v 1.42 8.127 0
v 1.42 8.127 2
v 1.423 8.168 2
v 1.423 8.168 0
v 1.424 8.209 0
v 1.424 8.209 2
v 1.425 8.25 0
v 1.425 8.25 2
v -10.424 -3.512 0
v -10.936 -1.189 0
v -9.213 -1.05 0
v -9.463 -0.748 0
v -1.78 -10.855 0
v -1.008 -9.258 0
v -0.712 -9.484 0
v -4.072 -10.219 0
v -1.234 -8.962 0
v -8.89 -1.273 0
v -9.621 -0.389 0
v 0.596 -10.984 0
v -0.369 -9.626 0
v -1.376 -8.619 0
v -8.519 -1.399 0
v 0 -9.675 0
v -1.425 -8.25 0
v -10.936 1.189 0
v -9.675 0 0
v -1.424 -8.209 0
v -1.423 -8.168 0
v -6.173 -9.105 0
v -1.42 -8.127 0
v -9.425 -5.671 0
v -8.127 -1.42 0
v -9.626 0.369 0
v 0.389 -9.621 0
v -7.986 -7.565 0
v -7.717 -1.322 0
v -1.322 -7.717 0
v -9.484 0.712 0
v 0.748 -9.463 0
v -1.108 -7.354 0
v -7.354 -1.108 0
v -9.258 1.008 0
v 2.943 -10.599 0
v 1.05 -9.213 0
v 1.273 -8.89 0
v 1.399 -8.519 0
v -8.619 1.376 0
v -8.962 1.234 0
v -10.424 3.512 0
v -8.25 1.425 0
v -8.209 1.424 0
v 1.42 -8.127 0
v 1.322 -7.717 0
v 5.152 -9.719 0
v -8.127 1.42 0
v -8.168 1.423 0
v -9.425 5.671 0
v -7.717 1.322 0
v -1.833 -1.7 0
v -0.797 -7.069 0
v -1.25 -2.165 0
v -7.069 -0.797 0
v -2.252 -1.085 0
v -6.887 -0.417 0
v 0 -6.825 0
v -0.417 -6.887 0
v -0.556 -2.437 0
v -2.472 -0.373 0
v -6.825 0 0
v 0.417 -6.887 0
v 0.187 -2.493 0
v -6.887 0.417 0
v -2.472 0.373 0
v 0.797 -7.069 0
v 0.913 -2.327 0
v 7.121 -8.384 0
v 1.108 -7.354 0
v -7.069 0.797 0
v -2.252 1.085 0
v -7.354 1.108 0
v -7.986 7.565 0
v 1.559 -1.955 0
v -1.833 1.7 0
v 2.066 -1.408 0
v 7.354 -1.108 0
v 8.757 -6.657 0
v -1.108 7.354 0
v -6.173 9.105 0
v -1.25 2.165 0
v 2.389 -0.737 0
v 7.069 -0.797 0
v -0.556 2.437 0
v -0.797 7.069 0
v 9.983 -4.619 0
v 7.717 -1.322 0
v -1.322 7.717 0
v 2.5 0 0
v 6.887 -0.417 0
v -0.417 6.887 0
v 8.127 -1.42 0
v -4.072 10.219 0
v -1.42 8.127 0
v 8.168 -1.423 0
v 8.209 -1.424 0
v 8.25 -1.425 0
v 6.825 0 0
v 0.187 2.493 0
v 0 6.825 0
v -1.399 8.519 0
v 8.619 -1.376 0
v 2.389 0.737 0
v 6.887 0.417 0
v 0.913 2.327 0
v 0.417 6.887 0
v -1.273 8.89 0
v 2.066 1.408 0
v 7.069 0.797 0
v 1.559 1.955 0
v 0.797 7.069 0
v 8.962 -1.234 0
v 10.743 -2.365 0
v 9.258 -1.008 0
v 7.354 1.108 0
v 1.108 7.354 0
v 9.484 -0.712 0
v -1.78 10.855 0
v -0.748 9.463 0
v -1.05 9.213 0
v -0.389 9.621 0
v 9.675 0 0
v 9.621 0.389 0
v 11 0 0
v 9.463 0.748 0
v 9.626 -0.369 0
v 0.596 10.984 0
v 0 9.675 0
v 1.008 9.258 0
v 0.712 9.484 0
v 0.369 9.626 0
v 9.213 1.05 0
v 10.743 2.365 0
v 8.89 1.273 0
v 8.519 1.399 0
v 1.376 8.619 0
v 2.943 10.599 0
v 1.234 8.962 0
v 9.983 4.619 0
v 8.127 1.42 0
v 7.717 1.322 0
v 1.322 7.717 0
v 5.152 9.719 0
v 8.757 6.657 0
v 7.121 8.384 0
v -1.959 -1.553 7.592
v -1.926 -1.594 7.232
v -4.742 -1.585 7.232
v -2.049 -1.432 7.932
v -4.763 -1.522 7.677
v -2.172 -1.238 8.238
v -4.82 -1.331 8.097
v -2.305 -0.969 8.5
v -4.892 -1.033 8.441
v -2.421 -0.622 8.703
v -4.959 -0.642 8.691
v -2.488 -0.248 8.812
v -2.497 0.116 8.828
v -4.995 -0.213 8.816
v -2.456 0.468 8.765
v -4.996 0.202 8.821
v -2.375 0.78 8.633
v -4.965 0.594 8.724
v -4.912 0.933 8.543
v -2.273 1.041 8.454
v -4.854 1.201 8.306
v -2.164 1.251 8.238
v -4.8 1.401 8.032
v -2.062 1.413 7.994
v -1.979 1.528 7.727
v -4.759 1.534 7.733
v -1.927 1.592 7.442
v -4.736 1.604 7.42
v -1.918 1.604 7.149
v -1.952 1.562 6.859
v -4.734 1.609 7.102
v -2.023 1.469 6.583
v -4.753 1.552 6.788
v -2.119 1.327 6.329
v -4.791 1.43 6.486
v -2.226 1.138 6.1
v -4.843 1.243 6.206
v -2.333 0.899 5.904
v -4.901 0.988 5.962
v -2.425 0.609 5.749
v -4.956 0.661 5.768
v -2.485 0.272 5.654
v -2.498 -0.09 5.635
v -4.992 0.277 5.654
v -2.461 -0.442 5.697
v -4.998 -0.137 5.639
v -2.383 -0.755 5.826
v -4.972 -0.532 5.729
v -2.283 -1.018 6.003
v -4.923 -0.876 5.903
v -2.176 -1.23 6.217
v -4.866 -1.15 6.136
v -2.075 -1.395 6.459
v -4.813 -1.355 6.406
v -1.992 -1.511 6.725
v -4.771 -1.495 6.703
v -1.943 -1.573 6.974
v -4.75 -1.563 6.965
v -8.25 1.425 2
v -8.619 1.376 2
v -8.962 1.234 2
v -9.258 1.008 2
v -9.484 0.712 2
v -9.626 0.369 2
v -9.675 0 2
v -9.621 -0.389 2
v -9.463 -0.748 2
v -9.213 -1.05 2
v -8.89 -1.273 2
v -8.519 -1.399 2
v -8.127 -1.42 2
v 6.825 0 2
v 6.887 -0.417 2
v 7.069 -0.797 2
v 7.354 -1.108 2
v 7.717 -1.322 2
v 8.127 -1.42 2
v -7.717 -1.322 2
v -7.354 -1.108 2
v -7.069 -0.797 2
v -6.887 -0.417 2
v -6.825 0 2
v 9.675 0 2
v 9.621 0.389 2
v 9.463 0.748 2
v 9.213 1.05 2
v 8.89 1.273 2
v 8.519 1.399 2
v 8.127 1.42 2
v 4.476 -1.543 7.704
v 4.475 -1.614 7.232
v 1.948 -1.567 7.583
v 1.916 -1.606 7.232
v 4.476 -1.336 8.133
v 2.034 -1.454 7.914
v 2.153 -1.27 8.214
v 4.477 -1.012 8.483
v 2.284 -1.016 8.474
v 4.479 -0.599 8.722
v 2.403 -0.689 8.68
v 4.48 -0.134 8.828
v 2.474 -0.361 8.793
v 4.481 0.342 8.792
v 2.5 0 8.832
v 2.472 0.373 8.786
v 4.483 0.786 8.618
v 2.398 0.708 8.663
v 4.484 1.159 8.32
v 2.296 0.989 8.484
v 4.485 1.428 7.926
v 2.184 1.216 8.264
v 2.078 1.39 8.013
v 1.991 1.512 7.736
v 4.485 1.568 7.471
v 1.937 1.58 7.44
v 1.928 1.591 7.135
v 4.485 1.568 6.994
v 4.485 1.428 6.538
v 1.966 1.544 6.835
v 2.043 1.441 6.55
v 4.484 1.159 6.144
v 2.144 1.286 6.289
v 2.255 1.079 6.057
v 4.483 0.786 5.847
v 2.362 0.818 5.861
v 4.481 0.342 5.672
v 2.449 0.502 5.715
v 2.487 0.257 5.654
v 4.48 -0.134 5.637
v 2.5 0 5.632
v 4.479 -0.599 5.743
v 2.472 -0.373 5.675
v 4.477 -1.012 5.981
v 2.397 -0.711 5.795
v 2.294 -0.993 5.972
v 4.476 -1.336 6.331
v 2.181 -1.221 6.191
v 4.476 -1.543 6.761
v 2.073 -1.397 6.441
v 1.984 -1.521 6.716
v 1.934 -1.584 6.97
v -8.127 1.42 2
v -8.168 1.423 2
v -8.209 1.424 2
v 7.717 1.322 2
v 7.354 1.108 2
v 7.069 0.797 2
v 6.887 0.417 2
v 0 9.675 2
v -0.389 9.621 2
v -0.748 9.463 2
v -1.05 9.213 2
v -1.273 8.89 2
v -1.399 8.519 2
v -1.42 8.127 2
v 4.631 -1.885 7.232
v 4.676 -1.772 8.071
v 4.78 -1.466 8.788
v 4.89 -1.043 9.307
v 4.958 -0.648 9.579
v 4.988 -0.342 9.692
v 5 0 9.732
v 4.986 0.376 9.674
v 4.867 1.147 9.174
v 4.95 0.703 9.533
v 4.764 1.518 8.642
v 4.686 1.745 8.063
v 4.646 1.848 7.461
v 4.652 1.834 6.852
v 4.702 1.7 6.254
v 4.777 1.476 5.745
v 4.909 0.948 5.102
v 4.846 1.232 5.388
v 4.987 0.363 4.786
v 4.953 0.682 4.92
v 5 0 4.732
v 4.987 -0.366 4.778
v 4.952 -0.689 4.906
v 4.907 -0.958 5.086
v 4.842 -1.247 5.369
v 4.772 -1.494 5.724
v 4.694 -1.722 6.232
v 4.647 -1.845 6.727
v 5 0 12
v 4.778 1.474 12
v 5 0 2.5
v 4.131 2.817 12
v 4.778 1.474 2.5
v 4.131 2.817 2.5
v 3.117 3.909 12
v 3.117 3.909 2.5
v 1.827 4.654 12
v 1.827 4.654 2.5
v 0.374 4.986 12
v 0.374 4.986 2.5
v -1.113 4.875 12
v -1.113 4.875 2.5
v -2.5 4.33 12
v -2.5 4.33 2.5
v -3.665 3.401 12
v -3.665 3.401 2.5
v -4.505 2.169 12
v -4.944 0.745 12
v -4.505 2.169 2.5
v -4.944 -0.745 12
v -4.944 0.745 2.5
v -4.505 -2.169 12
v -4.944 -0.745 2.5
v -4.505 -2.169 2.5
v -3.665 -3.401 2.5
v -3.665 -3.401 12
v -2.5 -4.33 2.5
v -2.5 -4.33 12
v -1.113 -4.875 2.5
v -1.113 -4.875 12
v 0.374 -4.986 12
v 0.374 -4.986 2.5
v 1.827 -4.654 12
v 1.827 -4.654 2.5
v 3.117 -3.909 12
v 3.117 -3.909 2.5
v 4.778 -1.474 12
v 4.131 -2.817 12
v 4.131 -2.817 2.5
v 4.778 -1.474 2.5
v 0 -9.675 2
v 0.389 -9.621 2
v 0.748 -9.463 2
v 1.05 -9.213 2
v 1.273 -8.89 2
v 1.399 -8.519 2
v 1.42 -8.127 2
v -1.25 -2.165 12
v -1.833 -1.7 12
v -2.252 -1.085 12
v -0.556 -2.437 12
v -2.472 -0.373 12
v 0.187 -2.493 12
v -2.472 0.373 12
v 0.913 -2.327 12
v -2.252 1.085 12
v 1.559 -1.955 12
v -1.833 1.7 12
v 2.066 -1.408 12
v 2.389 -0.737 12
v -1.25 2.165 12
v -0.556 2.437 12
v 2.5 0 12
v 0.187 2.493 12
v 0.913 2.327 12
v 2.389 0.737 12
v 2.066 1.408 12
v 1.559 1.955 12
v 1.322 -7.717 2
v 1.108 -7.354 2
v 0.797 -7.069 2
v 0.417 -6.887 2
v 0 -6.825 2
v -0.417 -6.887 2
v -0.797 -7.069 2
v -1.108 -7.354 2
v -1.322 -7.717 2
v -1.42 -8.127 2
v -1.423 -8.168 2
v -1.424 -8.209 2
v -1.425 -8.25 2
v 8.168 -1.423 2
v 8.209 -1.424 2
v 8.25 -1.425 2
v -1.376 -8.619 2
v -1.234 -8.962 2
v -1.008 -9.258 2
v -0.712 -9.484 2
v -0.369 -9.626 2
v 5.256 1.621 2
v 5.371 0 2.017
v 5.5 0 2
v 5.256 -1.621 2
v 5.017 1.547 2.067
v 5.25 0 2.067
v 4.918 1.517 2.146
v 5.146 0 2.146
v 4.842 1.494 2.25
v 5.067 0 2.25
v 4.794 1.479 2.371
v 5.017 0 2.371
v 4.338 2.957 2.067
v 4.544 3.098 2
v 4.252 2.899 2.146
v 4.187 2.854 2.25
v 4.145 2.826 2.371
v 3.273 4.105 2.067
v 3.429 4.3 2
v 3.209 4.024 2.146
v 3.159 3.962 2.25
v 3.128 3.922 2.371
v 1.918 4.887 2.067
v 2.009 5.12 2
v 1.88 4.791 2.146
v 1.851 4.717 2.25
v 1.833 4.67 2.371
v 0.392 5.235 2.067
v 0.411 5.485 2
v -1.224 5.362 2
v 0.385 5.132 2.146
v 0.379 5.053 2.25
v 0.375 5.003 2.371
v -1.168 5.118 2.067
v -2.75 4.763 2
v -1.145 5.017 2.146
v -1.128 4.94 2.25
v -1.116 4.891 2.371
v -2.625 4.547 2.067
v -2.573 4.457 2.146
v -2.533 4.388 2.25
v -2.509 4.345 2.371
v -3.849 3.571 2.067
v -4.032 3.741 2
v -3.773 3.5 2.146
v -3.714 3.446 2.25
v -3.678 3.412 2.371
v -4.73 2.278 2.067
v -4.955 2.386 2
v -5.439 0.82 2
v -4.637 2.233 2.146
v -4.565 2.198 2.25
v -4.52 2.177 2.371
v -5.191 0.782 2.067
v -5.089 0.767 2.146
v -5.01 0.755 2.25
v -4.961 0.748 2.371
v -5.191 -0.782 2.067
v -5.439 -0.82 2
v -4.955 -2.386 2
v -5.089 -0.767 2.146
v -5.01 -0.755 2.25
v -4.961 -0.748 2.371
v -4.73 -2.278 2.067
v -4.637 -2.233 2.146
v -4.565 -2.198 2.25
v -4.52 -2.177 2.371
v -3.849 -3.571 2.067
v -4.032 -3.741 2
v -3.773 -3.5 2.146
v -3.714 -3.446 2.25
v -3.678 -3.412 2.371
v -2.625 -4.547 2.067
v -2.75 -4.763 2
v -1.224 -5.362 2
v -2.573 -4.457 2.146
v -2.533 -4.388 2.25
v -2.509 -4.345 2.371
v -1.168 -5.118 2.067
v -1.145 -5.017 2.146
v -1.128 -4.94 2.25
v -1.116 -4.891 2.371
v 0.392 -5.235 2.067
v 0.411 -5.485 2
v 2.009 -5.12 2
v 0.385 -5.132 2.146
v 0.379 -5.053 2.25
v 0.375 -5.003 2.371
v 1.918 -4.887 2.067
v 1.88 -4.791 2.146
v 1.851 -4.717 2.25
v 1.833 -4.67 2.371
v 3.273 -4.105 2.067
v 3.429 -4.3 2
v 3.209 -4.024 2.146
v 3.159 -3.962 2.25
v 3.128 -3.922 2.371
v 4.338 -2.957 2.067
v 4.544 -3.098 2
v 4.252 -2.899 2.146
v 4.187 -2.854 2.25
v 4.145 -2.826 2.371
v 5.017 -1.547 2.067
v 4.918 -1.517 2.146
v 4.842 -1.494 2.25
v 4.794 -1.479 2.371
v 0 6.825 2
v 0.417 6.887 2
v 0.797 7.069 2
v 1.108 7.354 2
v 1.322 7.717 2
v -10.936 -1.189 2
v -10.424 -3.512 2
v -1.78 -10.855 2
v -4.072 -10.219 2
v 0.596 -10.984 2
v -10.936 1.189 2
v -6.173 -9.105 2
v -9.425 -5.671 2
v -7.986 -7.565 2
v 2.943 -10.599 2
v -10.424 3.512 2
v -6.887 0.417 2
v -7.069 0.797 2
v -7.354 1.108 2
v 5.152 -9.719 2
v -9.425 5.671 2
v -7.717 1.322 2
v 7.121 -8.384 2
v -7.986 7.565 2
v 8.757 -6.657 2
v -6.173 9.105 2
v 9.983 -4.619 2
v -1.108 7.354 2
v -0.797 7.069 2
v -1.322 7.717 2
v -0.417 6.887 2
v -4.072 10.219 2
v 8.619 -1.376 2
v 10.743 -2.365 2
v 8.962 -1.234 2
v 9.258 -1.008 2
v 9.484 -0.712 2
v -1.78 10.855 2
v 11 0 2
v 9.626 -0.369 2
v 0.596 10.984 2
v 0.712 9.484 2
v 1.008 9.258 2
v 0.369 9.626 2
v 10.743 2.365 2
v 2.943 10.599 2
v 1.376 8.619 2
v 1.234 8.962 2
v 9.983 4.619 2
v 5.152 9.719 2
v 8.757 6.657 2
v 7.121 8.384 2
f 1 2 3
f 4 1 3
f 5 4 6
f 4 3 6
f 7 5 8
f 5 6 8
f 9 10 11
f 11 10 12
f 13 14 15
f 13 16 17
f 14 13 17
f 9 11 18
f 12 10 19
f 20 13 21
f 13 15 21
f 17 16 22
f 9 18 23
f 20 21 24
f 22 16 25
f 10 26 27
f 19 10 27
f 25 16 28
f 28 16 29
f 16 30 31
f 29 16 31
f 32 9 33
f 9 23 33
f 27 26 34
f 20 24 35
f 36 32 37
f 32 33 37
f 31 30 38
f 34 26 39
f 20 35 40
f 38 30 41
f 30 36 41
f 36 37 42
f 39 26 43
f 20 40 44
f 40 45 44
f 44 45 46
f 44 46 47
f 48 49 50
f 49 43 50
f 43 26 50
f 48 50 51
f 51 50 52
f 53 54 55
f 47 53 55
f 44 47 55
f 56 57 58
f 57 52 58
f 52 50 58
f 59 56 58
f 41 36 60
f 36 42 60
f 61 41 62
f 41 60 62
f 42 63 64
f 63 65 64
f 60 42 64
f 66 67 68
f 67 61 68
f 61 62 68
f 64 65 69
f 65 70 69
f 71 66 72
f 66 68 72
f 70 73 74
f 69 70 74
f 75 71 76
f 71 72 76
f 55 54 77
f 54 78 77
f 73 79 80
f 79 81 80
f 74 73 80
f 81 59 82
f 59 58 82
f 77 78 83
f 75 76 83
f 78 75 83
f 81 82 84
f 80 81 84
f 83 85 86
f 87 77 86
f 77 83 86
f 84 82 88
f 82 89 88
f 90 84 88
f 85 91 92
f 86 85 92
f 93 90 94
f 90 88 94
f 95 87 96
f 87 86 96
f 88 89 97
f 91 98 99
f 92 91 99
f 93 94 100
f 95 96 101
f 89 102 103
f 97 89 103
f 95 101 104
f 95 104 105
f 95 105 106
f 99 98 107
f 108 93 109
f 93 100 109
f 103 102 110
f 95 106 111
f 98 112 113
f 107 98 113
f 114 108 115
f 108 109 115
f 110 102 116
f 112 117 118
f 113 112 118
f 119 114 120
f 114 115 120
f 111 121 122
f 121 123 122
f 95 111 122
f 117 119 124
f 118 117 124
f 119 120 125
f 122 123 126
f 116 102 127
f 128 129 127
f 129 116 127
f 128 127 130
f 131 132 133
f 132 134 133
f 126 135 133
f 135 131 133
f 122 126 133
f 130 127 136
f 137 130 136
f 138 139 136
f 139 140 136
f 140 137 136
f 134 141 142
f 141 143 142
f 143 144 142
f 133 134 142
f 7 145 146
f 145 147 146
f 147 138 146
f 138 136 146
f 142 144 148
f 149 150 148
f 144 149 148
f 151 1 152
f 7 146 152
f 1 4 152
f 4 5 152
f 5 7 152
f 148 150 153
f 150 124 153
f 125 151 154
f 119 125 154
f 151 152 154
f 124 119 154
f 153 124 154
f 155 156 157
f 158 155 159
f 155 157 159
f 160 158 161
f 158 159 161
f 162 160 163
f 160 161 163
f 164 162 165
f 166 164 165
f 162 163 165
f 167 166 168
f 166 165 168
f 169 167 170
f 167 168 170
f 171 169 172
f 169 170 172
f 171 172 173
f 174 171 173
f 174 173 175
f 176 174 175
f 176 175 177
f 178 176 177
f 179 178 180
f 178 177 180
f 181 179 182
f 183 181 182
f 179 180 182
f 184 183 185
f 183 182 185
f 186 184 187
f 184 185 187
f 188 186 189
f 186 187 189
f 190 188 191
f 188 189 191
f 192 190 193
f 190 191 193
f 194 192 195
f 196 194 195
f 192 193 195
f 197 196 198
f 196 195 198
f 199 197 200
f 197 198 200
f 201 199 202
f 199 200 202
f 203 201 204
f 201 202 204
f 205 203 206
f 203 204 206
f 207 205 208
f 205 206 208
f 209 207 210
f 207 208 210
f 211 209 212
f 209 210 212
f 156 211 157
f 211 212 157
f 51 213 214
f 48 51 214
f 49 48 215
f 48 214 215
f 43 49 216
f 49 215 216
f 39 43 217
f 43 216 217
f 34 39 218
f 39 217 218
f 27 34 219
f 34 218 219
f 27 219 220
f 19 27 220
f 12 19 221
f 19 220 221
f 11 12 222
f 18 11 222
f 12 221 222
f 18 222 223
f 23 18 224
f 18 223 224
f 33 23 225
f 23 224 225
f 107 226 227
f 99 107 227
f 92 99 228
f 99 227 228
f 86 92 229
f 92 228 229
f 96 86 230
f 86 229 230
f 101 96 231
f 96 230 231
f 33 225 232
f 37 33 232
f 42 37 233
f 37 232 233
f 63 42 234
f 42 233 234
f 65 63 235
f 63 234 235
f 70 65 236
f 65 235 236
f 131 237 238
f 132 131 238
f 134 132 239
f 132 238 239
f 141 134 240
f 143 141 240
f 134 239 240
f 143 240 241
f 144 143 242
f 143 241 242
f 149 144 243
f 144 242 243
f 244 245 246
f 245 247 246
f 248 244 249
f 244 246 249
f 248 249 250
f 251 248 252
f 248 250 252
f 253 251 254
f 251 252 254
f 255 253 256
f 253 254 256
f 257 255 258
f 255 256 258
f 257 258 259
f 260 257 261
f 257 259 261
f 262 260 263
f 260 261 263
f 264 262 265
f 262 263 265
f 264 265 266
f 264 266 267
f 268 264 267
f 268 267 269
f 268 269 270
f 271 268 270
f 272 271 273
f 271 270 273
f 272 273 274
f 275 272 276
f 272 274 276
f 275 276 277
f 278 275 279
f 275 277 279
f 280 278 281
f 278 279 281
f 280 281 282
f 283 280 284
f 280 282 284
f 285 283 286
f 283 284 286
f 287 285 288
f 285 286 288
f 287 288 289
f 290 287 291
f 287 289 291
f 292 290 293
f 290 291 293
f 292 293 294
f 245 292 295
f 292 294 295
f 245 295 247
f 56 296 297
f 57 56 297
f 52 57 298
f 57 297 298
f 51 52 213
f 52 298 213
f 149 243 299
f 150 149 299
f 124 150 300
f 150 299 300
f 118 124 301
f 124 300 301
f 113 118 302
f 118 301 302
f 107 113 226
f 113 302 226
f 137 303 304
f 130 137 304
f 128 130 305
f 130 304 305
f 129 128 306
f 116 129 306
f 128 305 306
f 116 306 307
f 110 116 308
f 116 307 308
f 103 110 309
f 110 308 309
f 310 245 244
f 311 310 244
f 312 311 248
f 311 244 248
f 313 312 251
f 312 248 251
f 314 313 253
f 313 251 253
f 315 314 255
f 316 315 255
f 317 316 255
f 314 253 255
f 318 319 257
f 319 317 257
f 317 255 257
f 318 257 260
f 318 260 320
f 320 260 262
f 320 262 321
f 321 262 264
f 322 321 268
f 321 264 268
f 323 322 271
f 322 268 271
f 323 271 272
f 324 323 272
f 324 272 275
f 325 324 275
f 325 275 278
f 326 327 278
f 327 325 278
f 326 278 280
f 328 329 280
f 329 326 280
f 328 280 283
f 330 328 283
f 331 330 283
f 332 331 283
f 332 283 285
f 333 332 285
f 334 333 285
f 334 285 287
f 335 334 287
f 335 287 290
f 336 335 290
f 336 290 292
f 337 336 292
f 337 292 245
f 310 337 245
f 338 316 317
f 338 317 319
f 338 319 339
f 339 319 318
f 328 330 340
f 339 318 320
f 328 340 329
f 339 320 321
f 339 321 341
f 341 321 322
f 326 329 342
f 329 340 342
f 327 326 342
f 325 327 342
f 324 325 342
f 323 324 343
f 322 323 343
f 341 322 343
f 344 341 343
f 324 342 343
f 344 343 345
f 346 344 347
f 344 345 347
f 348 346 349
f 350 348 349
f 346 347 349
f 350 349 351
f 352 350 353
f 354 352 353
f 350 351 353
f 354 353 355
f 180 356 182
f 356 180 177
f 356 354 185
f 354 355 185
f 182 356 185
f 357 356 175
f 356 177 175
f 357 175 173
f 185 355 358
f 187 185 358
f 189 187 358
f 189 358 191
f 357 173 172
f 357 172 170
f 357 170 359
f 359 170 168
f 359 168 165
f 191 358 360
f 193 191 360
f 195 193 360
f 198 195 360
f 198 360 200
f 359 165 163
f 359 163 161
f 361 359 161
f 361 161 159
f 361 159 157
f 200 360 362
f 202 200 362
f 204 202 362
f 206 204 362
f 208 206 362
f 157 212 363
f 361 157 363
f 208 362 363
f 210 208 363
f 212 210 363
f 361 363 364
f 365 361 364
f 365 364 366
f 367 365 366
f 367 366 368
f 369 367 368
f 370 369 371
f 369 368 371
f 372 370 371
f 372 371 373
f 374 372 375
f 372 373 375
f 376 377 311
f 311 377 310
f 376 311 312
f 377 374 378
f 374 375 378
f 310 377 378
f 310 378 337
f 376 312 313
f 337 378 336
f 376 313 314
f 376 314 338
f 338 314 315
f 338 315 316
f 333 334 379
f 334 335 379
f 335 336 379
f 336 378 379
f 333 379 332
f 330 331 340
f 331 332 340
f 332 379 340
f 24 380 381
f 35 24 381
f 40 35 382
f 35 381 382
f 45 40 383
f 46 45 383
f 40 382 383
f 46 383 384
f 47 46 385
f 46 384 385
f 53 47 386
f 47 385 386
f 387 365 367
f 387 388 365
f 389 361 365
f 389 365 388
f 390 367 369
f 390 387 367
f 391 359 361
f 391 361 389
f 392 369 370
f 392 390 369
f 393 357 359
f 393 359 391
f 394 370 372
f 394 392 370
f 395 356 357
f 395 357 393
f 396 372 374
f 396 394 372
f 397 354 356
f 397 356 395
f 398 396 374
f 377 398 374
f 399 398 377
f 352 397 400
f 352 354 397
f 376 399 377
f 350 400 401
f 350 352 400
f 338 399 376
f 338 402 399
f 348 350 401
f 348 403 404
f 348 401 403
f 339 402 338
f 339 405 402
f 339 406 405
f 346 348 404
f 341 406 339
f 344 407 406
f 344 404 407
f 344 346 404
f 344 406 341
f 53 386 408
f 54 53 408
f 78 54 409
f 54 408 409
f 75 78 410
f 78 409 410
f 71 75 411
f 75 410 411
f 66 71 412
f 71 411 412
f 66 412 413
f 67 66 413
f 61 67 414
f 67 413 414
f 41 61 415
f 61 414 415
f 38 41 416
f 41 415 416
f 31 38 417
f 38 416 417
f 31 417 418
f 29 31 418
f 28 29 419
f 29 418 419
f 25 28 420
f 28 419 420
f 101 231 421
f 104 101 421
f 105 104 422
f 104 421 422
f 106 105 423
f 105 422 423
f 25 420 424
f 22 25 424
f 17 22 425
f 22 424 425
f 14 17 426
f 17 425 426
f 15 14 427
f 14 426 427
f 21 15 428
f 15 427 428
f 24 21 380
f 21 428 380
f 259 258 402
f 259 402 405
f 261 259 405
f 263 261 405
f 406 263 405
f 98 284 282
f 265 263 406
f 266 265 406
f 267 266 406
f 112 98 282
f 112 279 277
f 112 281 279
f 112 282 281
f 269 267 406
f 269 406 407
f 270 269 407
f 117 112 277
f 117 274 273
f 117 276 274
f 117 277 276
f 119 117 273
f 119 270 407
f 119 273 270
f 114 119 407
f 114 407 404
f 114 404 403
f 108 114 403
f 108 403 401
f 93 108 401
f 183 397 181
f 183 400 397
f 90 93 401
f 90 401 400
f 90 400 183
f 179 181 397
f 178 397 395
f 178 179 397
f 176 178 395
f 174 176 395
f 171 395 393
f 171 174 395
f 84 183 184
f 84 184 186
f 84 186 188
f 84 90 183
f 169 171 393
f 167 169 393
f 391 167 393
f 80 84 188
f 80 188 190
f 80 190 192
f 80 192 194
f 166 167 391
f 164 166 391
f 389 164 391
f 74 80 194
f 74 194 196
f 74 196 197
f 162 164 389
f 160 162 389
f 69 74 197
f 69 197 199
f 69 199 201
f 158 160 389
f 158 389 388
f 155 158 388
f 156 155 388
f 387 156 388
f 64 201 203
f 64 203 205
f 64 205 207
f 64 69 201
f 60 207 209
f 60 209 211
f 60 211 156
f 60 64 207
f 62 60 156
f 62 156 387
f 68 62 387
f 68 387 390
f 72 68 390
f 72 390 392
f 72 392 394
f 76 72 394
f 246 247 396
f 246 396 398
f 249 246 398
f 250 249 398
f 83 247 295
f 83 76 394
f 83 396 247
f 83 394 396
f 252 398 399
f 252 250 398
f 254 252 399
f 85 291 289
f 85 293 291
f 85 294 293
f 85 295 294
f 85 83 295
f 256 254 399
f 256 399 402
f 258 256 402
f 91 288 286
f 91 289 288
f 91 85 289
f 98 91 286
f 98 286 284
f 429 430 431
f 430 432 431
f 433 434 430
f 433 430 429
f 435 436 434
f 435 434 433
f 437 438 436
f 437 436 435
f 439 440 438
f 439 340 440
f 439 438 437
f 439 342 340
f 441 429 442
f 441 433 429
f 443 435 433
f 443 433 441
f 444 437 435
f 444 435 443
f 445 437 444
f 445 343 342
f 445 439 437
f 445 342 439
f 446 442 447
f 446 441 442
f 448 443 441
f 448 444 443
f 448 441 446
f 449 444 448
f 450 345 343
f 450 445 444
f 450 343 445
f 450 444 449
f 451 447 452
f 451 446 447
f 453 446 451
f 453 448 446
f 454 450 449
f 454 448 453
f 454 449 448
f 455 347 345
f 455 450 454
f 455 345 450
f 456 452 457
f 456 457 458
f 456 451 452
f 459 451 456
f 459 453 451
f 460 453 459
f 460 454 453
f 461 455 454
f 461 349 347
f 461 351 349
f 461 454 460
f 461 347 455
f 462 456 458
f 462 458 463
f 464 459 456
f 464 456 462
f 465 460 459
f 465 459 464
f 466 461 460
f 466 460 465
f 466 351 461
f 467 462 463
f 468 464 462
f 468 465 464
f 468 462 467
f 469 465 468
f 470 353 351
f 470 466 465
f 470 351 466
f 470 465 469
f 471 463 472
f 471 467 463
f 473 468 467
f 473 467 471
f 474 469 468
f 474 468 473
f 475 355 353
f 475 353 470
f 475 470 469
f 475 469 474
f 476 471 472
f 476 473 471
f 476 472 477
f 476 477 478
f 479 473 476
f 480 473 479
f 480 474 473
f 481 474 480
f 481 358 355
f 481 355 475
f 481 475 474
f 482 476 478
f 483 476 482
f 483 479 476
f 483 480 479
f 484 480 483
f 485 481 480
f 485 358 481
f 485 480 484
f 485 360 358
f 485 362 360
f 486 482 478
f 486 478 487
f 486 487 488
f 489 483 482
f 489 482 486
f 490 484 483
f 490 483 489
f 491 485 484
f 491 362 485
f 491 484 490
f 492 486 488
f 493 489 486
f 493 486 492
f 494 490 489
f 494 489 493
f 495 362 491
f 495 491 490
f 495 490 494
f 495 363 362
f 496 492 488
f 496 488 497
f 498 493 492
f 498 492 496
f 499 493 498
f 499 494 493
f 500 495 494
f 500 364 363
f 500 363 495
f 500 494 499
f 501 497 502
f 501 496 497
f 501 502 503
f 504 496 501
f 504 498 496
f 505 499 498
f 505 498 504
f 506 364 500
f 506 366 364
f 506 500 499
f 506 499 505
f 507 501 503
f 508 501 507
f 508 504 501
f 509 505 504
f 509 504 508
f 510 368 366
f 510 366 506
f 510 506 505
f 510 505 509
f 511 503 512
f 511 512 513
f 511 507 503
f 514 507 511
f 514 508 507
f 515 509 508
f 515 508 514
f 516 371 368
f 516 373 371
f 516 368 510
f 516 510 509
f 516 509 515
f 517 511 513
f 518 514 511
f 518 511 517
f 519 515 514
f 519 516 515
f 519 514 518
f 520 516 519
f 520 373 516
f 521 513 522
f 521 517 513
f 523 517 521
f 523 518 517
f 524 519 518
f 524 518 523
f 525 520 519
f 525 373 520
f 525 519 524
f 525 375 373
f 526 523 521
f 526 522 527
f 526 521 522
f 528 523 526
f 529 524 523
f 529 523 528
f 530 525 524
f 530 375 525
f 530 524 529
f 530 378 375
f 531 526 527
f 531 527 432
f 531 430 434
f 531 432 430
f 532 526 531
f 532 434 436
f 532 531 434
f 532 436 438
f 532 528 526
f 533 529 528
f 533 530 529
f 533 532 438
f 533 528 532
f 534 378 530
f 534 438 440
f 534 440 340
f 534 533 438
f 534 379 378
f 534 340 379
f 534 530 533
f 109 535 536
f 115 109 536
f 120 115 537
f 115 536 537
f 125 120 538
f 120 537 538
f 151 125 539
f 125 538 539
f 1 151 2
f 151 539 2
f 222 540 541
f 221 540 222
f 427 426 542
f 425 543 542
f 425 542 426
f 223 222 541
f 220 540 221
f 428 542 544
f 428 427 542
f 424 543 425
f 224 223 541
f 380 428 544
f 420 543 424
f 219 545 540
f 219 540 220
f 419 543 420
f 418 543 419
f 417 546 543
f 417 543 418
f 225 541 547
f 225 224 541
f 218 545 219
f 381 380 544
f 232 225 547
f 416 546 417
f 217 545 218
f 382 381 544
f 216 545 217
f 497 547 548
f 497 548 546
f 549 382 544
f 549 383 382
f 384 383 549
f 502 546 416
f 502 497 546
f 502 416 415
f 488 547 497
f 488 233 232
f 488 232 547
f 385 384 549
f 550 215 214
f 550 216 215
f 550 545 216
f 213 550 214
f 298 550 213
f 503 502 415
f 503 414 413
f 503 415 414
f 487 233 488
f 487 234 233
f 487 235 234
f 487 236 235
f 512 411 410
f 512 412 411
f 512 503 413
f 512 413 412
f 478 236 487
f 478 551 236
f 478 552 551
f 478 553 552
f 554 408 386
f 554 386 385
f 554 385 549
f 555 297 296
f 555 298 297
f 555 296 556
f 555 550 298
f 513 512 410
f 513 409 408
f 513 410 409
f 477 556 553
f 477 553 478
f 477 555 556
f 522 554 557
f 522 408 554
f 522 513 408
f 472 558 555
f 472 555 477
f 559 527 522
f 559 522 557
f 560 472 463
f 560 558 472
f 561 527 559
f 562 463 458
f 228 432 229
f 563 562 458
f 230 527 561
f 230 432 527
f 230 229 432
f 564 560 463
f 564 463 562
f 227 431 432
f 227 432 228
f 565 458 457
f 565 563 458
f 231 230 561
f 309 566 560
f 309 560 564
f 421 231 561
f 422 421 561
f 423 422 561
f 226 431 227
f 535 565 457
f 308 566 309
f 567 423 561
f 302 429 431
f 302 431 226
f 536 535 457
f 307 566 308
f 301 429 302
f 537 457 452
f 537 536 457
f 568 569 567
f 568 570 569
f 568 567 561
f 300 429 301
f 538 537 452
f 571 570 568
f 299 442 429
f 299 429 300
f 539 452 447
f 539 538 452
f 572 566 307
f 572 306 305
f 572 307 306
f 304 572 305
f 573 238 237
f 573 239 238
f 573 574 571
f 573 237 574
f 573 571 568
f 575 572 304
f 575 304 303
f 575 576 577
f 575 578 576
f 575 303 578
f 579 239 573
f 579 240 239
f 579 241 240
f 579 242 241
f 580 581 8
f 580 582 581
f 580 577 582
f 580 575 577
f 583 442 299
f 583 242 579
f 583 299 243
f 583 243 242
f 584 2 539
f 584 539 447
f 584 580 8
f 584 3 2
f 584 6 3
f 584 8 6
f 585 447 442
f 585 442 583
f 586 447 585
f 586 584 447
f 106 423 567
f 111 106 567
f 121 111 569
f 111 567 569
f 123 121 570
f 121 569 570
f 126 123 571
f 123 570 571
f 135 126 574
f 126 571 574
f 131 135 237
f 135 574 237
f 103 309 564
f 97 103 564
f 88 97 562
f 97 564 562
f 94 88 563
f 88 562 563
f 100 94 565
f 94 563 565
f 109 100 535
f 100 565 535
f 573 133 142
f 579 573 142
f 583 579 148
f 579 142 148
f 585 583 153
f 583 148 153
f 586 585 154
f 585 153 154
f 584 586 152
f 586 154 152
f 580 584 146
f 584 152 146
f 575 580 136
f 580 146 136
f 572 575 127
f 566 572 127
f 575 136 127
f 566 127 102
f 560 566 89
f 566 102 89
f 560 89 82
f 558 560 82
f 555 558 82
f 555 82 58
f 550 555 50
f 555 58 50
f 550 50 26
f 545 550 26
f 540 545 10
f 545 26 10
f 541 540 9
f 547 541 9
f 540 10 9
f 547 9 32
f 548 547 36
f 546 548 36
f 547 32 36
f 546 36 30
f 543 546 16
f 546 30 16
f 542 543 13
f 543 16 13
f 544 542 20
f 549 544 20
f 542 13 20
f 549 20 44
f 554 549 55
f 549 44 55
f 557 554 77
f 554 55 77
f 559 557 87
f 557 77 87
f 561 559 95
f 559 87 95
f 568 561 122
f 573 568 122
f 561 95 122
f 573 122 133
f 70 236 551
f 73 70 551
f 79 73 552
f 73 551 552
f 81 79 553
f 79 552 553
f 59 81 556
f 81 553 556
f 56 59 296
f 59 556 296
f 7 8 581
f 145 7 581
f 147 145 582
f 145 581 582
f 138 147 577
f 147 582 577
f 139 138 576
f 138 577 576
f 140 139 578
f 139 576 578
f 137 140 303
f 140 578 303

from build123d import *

# Parameters (mm, degrees)
SKETCH1_R                                       = 5
SKETCH1_R_2                                     = 2.5
BOSS_EXTRUDE2_DEPTH                             = 12
SKETCH3_R                                       = 11
SKETCH3_R_2                                     = 5
BOSS_EXTRUDE3_DEPTH                             = 2
FILLET1_R                                       = 0.5
CUT_EXTRUDE1_DEPTH                              = 2
CIRPATTERN1_COUNT                               = 4
CSK_FOR_M3_FLAT_HEAD_MACHINE_SCREW2_D           = 3.2
CSK_FOR_M3_FLAT_HEAD_MACHINE_SCREW2_CSINK_D     = 5
CSK_FOR_M3_FLAT_HEAD_MACHINE_SCREW2_CSINK_ANGLE = 120


with BuildPart() as part:
    # Sketch1 → Boss-Extrude2 (new body)
    with BuildSketch(Plane.XY):
        Circle(SKETCH1_R)
        Circle(SKETCH1_R_2, mode=Mode.SUBTRACT)
    extrude(amount=BOSS_EXTRUDE2_DEPTH)

    # Sketch3 → Boss-Extrude3 (add)
    with BuildSketch(Plane.XY):
        Circle(SKETCH3_R)
        Circle(SKETCH3_R_2, mode=Mode.SUBTRACT)
    extrude(amount=BOSS_EXTRUDE3_DEPTH)

    # Fillet1
    fillet1_edges = [part.edges().sort_by_distance(p)[0] for p in [
        (-5, 0, 2),
    ]]
    fillet(fillet1_edges, radius=FILLET1_R)

    # Sketch5 → Cut-Extrude1 (cut)
    with BuildSketch(Plane.XY.offset(2)):
        with BuildLine():
            ThreePointArc((-1.419675746, 8.126931818), (-0.963133646, 7.199762608), (0, 6.825))
            Line((0, 6.825), (0, 8.25))
            ThreePointArc((0, 8.25), (-0.7125, 8.219175369), (-1.419675746, 8.126931818))
        make_face()
        with BuildLine():
            Line((0, 8.25), (0, 6.825))
            ThreePointArc((0, 6.825), (0.963133646, 7.199762608), (1.419675746, 8.126931818))
            ThreePointArc((1.419675746, 8.126931818), (0.7125, 8.219175369), (0, 8.25))
        make_face()
        with BuildLine():
            ThreePointArc((-1.419675746, 8.126931818), (-0.7125, 8.219175369), (0, 8.25))
            Line((0, 8.25), (0, 9.675))
            ThreePointArc((0, 9.675), (-1.050237392, 9.213133646), (-1.419675746, 8.126931818))
        make_face()
        with BuildLine():
            Line((0, 9.675), (0, 8.25))
            ThreePointArc((0, 8.25), (0.7125, 8.219175369), (1.419675746, 8.126931818))
            ThreePointArc((1.419675746, 8.126931818), (1.423668314, 8.188408351), (1.425, 8.25))
            ThreePointArc((1.425, 8.25), (1.007627163, 9.257627163), (0, 9.675))
        make_face()
    cut_extrude1 = extrude(amount=-CUT_EXTRUDE1_DEPTH, mode=Mode.SUBTRACT)

    # CirPattern1: Cut-Extrude1 ×4 about axis
    cirpattern1_axis = Axis((0, 0, 0), (0, 0, 1))
    for i in range(1, CIRPATTERN1_COUNT):
        add(cut_extrude1.rotate(cirpattern1_axis, i * 360 / CIRPATTERN1_COUNT), mode=Mode.SUBTRACT)

    # CSK for M3 Flat Head Machine Screw2 (through all)
    with Locations(Plane(origin=(4.999975674, -0.015596745, 7.232142879), x_dir=(0.003119349, 0.999995135, 0), z_dir=(0.999995135, -0.003119349, 0))):
        with Locations((0, 0)):
            CounterSinkHole(CSK_FOR_M3_FLAT_HEAD_MACHINE_SCREW2_D / 2, CSK_FOR_M3_FLAT_HEAD_MACHINE_SCREW2_CSINK_D / 2, counter_sink_angle=CSK_FOR_M3_FLAT_HEAD_MACHINE_SCREW2_CSINK_ANGLE)


solid = part.part
